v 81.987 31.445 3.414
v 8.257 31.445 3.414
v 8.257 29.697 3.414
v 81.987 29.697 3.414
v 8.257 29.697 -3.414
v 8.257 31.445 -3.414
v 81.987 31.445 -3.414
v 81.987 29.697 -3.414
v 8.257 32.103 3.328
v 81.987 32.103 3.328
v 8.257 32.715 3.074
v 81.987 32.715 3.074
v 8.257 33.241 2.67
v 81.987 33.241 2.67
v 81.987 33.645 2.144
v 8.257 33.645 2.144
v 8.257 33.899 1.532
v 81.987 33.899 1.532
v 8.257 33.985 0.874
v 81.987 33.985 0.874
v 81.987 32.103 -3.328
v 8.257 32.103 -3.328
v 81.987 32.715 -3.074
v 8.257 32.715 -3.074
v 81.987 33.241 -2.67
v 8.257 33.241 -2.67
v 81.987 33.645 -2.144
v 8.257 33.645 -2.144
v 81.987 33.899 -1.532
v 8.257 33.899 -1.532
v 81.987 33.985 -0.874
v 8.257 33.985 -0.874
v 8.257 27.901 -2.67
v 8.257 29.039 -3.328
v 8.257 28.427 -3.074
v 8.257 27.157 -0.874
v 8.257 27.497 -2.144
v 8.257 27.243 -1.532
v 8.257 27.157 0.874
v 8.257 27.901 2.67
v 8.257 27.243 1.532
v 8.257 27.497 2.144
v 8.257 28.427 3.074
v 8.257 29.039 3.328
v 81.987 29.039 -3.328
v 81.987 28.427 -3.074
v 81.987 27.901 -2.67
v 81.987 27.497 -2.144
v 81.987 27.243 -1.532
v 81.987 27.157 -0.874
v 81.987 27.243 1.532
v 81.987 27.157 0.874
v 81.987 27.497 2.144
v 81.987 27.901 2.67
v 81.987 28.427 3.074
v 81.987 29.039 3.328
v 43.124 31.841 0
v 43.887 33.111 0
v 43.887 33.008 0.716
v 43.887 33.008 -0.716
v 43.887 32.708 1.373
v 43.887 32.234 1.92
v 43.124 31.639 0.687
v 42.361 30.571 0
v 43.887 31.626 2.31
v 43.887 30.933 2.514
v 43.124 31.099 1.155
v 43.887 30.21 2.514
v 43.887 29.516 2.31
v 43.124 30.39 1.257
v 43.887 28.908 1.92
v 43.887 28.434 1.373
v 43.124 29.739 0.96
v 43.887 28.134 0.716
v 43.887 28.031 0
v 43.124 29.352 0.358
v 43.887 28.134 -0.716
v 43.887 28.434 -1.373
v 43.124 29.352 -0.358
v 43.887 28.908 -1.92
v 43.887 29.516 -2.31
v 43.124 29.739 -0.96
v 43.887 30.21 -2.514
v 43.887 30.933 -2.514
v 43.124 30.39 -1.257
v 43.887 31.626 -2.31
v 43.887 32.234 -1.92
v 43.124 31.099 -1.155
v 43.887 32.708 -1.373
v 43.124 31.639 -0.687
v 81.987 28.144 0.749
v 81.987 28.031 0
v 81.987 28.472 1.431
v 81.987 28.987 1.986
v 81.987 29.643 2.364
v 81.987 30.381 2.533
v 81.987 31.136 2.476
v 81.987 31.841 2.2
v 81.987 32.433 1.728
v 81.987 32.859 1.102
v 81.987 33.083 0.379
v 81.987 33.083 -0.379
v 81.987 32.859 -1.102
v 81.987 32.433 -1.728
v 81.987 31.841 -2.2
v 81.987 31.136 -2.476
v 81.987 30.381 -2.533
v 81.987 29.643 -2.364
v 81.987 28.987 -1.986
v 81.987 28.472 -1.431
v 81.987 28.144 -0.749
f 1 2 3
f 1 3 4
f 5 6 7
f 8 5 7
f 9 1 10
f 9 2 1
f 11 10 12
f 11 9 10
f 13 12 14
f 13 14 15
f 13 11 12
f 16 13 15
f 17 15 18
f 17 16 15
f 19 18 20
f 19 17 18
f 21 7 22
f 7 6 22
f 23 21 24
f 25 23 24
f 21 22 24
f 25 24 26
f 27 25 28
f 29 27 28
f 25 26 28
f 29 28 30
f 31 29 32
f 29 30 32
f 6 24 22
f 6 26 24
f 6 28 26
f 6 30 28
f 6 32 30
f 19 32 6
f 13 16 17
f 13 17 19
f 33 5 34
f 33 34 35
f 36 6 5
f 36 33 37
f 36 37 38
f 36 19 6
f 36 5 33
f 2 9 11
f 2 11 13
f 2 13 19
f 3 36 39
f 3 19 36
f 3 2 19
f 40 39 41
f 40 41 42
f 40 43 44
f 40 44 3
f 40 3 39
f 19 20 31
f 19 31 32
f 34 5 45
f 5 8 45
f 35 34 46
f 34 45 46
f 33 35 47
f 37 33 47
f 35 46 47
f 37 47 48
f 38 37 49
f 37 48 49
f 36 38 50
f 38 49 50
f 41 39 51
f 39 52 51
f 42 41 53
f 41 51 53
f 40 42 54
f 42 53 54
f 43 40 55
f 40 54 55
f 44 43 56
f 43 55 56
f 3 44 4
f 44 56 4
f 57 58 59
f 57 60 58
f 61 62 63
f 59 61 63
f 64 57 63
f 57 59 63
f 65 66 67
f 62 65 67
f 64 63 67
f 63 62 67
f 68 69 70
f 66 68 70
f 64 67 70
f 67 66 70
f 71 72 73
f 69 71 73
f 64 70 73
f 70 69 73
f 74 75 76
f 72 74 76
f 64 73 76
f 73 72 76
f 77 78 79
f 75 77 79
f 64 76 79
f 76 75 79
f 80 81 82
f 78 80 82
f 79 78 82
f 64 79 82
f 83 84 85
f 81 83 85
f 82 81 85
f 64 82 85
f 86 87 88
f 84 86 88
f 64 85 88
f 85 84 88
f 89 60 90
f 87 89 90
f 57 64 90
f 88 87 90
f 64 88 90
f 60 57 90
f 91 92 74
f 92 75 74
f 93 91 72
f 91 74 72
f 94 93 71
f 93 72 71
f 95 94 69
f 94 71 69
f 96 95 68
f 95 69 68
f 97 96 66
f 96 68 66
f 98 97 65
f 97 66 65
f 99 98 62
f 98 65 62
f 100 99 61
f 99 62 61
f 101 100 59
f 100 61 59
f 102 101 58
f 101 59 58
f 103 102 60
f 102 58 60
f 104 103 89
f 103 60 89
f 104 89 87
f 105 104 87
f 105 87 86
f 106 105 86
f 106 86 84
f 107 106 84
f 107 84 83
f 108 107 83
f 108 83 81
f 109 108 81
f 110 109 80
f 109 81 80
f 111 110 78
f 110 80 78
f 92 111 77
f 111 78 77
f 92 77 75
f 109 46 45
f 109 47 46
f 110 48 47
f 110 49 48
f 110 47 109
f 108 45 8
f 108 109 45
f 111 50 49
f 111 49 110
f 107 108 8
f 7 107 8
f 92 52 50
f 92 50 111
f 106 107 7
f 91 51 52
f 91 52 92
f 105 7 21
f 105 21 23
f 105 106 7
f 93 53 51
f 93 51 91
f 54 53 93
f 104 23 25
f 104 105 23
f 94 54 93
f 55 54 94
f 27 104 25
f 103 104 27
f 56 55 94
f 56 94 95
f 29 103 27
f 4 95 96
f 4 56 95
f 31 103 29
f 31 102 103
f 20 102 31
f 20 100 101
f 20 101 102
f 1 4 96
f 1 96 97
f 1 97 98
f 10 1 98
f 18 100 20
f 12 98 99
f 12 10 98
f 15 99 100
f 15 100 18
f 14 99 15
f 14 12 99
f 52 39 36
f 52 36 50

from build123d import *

# Parameters (mm, degrees)
F1_DEPTH      = 3.414395
F1_DEPTH_BACK = 3.414395
F3_D          = 5.08
F3_DEPTH      = 38.1
F3_TIP        = 1.5261859723
F4_R          = 2.54


with BuildPart() as f1:
    # F0 (on Top) → F1 (new body, two sides)
    with BuildSketch(Plane.XY) as f1_sk:
        Polygon((27.5532683375, 33.9854207361), (8.2568451762, 33.9854207361), (8.2568451762, 27.1566307361), (62.6822561026, 27.1566307361), (81.9869935513, 27.1566307361), (81.9869935513, 33.9854207361), (78.0837014318, 33.9854207361), (71.3711140723, 33.9854207361), (58.8463247403, 33.9854207361), (56.5806804269, 33.9854207361), (53.2887220937, 33.9854207361), (51.0230777803, 33.9854207361), (45.4654522794, 33.9854207361), (43.199807966, 33.9854207361), (37.6421824652, 33.9854207361), (35.3765381518, 33.9854207361), (29.8189126509, 33.9854207361), align=None)
    extrude(amount=F1_DEPTH)
    extrude(f1_sk.sketch, amount=-F1_DEPTH_BACK)

    # F3
    with Locations(Plane.YZ.offset(81.9869935513)):
        with Locations((30.5710257361, 0)):
            Hole(F3_D / 2, depth=F3_DEPTH)
            with Locations((0, 0, -(F3_DEPTH + F3_TIP / 2))):  # 118° drill point
                Cone(0, F3_D / 2, F3_TIP, mode=Mode.SUBTRACT)

    # F4
    f4_edges = [f1.edges().sort_by_distance(p)[0] for p in [
        (45.121919, 33.985421, 3.414395),
        (45.121919, 27.156631, 3.414395),
        (45.121919, 33.985421, -3.414395),
        (45.121919, 27.156631, -3.414395),
    ]]
    fillet(f4_edges, radius=F4_R)


solid = f1.part
